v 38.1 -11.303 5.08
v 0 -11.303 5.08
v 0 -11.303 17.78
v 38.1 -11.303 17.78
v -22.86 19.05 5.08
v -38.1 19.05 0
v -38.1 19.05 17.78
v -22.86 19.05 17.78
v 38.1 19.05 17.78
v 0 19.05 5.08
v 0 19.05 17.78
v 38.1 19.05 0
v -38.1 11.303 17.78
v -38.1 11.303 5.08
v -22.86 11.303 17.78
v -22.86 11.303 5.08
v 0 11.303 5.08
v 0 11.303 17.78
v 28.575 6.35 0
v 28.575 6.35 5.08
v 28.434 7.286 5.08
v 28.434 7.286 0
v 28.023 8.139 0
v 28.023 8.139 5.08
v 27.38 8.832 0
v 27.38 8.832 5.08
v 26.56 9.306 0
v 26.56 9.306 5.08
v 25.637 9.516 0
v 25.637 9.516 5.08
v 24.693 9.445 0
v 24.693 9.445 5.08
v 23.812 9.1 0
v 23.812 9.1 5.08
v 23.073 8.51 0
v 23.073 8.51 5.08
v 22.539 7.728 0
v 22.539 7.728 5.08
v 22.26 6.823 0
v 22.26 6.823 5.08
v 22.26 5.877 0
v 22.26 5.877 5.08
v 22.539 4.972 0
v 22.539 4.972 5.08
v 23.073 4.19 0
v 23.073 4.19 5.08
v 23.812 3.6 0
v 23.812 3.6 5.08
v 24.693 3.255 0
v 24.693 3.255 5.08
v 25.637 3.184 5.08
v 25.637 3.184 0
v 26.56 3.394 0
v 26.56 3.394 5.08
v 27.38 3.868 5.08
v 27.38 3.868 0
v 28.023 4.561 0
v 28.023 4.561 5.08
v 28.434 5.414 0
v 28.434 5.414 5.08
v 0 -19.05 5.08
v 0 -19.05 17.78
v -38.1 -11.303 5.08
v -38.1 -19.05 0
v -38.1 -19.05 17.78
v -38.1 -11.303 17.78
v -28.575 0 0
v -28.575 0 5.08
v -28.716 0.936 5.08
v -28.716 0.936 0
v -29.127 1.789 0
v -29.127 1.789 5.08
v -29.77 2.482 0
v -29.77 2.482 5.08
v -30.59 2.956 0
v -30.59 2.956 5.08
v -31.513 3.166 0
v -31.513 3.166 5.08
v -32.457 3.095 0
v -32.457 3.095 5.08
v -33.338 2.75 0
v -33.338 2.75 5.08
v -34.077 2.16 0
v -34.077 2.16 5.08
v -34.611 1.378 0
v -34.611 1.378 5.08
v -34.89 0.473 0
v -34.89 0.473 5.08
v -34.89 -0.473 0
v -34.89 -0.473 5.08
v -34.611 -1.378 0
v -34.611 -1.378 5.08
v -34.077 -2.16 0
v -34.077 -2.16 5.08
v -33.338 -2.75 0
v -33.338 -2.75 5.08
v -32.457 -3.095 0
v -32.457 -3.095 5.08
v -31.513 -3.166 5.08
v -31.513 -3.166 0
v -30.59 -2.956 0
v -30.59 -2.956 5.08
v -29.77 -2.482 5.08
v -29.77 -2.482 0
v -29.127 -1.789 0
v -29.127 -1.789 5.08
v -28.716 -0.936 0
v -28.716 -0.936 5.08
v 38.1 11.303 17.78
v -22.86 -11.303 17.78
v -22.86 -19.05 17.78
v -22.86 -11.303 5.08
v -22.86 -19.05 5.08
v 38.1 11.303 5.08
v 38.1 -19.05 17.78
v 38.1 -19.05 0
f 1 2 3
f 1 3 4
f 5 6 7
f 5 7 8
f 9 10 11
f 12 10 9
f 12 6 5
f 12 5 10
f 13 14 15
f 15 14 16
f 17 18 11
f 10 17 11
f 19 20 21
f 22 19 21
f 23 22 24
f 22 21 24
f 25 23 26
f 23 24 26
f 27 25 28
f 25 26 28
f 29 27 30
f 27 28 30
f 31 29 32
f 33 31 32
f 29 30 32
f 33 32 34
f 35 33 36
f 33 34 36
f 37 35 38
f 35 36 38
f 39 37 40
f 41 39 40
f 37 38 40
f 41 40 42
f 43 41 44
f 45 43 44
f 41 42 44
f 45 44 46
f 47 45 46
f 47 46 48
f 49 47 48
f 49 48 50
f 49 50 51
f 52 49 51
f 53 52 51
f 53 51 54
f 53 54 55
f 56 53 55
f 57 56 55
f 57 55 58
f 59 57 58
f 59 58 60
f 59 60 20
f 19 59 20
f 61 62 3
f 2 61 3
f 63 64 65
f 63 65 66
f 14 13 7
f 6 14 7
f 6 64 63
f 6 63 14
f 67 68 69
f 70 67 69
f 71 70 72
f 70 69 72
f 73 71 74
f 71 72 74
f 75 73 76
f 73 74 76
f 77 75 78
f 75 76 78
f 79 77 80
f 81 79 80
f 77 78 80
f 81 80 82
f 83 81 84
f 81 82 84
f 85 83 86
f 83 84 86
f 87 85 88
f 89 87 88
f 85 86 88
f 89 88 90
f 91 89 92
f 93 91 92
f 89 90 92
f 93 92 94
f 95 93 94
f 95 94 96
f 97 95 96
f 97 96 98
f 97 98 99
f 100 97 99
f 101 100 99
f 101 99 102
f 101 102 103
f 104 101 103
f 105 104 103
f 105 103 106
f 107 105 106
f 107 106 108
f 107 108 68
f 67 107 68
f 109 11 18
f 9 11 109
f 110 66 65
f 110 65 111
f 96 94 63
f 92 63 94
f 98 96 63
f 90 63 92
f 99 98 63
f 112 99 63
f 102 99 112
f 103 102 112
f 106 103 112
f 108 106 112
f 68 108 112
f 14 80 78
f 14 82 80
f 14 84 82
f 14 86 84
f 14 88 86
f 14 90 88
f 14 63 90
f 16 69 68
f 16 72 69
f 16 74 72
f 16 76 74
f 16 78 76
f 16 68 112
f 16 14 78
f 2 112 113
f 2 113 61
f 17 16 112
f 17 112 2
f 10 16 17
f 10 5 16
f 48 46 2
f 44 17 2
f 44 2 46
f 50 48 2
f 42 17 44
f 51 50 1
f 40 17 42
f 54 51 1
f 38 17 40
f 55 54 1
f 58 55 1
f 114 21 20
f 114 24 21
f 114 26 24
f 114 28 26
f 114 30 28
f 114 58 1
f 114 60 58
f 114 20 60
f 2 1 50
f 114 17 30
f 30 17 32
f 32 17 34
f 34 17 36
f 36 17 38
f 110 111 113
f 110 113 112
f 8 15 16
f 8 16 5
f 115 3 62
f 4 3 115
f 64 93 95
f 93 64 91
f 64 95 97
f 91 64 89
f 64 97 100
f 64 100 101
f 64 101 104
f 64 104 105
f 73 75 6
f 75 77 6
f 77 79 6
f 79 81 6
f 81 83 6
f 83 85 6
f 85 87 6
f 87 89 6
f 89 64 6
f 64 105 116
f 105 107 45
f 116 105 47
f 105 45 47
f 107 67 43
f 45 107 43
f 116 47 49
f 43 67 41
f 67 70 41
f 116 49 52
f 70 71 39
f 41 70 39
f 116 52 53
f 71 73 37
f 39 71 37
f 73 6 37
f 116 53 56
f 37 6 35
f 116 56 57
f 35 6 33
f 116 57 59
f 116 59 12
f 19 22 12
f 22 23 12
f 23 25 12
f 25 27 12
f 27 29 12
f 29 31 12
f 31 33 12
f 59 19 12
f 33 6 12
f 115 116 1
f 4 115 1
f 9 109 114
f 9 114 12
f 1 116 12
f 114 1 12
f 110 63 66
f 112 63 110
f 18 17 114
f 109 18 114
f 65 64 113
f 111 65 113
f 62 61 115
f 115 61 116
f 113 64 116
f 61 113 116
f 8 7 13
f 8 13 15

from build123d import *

# Parameters (mm, degrees)
SKETCH1_W           = 76.2
SKETCH1_H           = 38.1
BOSS_EXTRUDE1_DEPTH = 5.08
SKETCH2_W           = 38.1
SKETCH2_H           = 7.747
SKETCH2_W_2         = 15.24
BOSS_EXTRUDE2_DEPTH = 12.7
SKETCH3_R           = 3.175
CUT_EXTRUDE1_DEPTH  = 6.08
SKETCH4_R           = 3.175
CUT_EXTRUDE2_DEPTH  = 6.08


with BuildPart() as part:
    # Sketch1 → Boss-Extrude1 (new body)
    with BuildSketch(Plane.XY):
        Rectangle(SKETCH1_W, SKETCH1_H)
    extrude(amount=BOSS_EXTRUDE1_DEPTH)

    # Sketch2 → Boss-Extrude2 (add)
    with BuildSketch(Plane.XY.offset(5.08)):
        with Locations((19.05, 15.1765)):
            Rectangle(SKETCH2_W, SKETCH2_H)
        with Locations((19.05, -15.1765)):
            Rectangle(SKETCH2_W, SKETCH2_H)
        with Locations((-30.48, 15.1765)):
            Rectangle(SKETCH2_W_2, SKETCH2_H)
        with Locations((-30.48, -15.1765)):
            Rectangle(SKETCH2_W_2, SKETCH2_H)
    extrude(amount=BOSS_EXTRUDE2_DEPTH)

    # Sketch3 → Cut-Extrude1 (cut, through all)
    with BuildSketch(Plane.XY.offset(5.08)):
        with Locations((25.4, 6.35)):
            Circle(SKETCH3_R)
    extrude(amount=-CUT_EXTRUDE1_DEPTH, mode=Mode.SUBTRACT)

    # Sketch4 → Cut-Extrude2 (cut, through all)
    with BuildSketch(Plane.XY.offset(5.08)):
        with Locations((-31.75, 0)):
            Circle(SKETCH4_R)
    extrude(amount=-CUT_EXTRUDE2_DEPTH, mode=Mode.SUBTRACT)


solid = part.part
